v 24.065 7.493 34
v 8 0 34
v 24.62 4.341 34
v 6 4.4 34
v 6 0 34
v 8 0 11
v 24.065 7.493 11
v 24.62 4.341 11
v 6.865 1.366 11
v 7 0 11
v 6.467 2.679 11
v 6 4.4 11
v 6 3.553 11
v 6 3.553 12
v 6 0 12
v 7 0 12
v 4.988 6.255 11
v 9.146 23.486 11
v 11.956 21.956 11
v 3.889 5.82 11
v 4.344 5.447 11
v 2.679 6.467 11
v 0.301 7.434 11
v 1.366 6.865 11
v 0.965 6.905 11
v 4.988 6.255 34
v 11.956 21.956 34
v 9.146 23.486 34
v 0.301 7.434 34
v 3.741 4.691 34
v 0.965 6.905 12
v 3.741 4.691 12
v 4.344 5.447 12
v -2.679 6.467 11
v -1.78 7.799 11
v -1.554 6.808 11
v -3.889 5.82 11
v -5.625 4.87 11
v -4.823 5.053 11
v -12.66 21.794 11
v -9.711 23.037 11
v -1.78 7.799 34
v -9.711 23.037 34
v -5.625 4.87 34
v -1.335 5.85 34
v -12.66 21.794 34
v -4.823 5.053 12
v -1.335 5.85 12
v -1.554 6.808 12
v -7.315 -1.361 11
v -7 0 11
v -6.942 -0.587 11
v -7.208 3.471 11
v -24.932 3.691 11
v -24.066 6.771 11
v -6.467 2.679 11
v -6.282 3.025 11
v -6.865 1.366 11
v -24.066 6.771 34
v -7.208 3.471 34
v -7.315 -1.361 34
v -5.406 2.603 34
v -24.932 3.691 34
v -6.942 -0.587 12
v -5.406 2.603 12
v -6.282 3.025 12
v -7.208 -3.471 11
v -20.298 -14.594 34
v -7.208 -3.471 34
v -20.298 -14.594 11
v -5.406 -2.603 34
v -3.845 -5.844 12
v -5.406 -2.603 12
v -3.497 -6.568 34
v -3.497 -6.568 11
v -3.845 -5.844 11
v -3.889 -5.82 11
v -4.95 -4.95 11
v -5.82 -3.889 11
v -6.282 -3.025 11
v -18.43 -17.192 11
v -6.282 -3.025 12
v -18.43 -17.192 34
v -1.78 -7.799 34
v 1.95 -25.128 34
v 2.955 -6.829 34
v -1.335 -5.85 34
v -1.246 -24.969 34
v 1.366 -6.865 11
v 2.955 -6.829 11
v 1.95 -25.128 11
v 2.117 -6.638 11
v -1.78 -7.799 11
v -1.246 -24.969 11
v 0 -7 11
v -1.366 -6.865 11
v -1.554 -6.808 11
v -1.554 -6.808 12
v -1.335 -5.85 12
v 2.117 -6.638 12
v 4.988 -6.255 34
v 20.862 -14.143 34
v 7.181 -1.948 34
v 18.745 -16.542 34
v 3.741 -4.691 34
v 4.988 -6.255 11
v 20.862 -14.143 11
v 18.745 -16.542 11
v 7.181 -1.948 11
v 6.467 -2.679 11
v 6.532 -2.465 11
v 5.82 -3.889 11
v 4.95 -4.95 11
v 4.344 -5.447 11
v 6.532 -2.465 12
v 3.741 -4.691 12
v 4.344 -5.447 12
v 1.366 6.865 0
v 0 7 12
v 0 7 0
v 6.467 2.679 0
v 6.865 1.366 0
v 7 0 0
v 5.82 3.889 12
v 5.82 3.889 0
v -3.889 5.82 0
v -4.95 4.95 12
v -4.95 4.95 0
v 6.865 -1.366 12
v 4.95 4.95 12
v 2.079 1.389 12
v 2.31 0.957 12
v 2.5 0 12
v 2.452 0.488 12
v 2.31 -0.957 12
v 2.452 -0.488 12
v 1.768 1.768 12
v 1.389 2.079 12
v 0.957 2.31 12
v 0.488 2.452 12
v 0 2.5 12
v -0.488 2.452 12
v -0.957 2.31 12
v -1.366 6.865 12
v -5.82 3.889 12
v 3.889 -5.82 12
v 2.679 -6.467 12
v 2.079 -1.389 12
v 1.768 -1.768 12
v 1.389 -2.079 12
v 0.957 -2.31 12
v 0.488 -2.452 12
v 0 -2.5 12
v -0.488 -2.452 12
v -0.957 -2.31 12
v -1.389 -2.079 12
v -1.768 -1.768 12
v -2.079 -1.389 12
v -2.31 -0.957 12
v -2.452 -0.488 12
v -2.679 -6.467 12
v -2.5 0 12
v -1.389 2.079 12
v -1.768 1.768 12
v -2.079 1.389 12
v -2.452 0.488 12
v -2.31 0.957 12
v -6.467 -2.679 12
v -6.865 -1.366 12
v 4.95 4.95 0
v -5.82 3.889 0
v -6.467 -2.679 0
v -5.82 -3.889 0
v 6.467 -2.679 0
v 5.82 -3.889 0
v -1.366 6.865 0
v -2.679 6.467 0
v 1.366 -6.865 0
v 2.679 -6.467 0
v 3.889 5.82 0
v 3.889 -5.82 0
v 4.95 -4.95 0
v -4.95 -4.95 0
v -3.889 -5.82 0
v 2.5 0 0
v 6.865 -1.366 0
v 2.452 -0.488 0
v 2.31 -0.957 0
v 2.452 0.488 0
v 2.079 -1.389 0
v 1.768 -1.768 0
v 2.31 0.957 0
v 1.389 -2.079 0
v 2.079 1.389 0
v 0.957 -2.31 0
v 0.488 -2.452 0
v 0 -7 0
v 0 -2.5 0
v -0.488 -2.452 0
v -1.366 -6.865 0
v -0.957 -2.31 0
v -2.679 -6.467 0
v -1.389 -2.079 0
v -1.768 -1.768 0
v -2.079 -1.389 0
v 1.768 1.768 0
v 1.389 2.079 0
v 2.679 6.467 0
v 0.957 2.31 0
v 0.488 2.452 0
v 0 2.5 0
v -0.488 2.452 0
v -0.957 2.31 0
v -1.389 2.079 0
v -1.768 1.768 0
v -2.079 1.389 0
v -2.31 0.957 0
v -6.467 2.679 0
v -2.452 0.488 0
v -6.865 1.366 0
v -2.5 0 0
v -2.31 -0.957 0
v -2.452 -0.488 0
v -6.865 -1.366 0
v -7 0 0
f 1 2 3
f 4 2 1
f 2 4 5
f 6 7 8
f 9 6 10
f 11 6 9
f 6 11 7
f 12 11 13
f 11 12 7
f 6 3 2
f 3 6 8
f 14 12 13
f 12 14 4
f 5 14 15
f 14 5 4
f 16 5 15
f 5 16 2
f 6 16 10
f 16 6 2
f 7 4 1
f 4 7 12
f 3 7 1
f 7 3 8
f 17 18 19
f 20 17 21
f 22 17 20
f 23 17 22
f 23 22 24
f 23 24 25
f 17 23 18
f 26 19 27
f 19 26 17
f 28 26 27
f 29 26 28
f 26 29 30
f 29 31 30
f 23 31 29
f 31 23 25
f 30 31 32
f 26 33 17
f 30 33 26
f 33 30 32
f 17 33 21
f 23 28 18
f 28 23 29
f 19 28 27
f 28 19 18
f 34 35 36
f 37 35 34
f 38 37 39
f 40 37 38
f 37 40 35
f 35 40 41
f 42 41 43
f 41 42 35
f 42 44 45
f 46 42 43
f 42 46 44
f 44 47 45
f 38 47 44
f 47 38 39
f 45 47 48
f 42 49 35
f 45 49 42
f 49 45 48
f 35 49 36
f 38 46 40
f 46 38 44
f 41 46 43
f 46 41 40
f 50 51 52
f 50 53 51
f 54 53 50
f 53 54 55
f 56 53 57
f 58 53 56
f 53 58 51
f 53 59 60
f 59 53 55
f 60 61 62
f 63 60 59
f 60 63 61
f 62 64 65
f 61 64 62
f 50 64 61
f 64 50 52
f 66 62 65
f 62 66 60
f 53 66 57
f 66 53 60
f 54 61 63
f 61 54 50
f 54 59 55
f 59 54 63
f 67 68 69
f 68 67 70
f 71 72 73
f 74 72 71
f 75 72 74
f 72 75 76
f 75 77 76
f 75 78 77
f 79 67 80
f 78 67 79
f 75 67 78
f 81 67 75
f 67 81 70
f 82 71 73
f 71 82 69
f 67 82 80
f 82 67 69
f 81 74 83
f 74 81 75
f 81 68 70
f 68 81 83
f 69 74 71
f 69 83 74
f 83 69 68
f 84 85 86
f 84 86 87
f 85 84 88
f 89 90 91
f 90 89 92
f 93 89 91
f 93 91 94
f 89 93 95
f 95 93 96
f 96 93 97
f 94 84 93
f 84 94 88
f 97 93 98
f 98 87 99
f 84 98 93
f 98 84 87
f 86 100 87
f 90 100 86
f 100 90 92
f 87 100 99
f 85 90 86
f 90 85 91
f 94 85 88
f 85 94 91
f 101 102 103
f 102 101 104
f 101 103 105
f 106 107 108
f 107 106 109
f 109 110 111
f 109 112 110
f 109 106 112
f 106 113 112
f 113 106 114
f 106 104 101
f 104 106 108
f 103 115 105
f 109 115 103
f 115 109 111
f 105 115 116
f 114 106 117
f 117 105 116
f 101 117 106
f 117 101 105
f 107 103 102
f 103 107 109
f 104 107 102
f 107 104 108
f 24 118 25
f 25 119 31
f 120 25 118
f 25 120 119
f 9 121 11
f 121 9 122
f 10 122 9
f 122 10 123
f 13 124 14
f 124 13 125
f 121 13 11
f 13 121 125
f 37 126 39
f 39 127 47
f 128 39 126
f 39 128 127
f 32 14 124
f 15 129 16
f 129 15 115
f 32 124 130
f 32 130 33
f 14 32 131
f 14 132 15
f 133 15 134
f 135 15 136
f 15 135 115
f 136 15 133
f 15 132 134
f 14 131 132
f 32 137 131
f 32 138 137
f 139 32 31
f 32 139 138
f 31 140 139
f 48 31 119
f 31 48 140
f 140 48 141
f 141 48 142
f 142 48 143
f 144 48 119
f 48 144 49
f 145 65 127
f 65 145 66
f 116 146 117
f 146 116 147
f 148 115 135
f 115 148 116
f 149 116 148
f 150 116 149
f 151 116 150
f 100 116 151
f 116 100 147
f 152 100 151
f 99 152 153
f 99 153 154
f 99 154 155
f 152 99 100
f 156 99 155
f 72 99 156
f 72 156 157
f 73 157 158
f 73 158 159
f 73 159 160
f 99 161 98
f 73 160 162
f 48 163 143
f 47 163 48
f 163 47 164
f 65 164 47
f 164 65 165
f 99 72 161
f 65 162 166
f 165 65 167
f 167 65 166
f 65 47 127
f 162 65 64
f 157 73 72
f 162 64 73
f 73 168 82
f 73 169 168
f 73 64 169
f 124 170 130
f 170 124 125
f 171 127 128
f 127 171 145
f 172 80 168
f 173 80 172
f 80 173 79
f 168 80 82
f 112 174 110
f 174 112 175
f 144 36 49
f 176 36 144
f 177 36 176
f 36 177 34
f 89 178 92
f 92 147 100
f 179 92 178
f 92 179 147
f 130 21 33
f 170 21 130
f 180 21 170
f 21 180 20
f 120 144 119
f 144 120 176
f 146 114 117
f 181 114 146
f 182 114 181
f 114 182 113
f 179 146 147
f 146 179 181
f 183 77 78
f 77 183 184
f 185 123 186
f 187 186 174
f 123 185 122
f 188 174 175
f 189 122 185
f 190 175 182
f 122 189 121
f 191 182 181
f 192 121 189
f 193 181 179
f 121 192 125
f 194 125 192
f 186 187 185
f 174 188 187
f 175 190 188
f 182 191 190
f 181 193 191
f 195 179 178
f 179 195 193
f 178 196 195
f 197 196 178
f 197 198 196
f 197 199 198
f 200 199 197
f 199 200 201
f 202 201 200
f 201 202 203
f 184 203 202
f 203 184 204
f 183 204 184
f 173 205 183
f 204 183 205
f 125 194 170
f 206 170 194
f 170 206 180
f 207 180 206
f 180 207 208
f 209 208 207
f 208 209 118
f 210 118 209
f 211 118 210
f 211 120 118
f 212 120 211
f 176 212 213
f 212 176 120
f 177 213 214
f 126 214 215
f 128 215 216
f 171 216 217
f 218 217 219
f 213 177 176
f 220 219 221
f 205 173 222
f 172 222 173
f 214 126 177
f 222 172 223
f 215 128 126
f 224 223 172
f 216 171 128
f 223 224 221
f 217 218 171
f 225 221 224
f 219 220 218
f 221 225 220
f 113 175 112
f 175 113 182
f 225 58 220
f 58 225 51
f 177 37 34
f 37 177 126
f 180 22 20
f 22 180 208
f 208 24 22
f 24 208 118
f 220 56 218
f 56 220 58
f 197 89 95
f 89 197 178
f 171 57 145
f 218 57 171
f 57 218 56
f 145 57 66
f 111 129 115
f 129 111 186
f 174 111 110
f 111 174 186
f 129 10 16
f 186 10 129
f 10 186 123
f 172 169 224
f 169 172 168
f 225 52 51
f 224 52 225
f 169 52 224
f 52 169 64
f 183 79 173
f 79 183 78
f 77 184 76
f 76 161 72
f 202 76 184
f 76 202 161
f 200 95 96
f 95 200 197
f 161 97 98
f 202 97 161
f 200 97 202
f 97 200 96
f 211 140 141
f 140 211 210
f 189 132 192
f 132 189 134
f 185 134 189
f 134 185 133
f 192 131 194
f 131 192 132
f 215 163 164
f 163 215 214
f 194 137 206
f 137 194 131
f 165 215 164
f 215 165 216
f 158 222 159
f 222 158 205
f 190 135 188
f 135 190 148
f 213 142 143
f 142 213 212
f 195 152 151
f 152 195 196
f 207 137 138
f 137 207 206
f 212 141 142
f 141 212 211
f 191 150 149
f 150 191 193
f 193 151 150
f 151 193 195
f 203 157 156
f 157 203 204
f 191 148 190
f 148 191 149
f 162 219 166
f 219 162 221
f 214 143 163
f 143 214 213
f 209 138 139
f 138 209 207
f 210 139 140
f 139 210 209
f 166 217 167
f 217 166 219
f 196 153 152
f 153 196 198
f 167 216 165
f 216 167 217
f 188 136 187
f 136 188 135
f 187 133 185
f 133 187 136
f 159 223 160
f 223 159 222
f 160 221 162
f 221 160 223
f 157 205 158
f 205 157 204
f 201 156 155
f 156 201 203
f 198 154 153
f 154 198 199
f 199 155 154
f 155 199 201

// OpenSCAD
$fn = 32;

// ----------------------------------------------------------------------
// Impeller: 50 mm, 7 blades, 34 mm tall
// ----------------------------------------------------------------------

// --- parameters (mm) ---
center_d = 14;            // hub diameter
center_h = 12;            // hub height
wheel_d = 50;             // outer diameter over the blades
blade_count = 7;          // number of blades
blade_t = 2;              // blade thickness
blade_h = 22;             // blade height
blade_in_r = 6;           // blade root radius
blade_out_r = 23;         // blade tip radius
sweep = 10;               // blade sweep, degrees
bore_d = 5;               // shaft bore

module hub() {
  cylinder(h = center_h, d = center_d);
}

module blade() {
  /* blade swept between two boxes: hull of the root and the tip section */
  hull() {
    translate([blade_in_r, 0, center_h - 1])
      cube([blade_t, blade_t * 2.2, blade_h + 1], center = false);
    rotate([0, 0, sweep])
      translate([blade_out_r, 0, center_h - 1])
        cube([blade_t, blade_t * 1.6, blade_h + 1], center = false);
  }
}

module blades() {
  for (i = [0 : blade_count - 1])
    rotate([0, 0, i * 360 / blade_count]) blade();
}

difference() {
  union() {
    hub();
    blades();
  }
  translate([0, 0, -1]) cylinder(h = center_h + blade_h + 0 + 3, d = bore_d);
}
